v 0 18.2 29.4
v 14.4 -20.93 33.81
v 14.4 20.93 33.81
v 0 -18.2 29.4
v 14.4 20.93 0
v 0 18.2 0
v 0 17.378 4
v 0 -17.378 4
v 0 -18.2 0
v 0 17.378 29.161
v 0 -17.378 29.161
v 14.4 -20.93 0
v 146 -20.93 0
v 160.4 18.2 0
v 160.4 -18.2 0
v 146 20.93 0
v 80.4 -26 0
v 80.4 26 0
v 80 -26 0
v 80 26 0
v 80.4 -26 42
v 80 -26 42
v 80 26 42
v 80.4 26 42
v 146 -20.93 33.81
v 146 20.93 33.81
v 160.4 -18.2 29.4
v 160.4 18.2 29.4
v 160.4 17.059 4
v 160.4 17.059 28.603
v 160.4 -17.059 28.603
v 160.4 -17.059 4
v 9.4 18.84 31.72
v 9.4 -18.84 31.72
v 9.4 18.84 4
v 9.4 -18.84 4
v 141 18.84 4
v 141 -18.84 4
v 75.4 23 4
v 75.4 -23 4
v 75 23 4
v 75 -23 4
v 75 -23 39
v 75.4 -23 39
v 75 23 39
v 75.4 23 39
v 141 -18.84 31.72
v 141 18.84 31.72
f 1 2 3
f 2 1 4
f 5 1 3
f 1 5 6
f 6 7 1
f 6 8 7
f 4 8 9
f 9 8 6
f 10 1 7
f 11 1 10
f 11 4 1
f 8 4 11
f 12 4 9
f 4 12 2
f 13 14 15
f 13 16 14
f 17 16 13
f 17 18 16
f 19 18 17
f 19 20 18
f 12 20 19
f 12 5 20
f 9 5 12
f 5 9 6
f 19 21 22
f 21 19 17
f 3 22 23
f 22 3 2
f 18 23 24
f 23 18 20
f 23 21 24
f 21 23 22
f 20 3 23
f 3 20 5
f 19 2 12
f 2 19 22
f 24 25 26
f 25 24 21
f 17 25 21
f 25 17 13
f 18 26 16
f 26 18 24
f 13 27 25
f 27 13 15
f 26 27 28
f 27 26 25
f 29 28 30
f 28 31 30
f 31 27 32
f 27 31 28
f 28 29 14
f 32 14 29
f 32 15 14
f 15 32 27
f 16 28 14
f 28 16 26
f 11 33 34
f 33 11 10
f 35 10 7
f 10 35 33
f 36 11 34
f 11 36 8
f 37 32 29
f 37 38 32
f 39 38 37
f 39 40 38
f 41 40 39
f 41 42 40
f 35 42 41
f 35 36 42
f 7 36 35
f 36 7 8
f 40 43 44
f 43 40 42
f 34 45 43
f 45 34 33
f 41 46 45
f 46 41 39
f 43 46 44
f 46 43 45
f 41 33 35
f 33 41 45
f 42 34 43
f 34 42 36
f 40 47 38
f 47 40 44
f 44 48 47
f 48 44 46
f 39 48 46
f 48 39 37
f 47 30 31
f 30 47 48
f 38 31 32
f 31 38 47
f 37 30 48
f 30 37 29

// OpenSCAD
$fn = 32;

// ----------------------------------------------------------------------
// Faired channel: 160 x 52 x 42 mm, 3 mm walls, faired ends
// ----------------------------------------------------------------------

// --- parameters (mm) ---
length = 160;             // channel length
width = 52;               // channel width at mid length
height = 42;              // channel height at mid length
wall = 3;                 // side wall thickness
floor_t = 4;              // floor thickness
end_w = 36.4;             // faired end width
end_h = 29.4;             // faired end height

difference() {
  union() {
    hull() {
      translate([0, -18.2, 0]) cube([0.4, 36.4, 29.4]);
      translate([14.4, -20.93, 0]) cube([0.4, 41.86, 33.81]);
    }
    hull() {
      translate([14.4, -20.93, 0]) cube([0.4, 41.86, 33.81]);
      translate([80, -26, 0]) cube([0.4, 52, 42]);
    }
    hull() {
      translate([80, -26, 0]) cube([0.4, 52, 42]);
      translate([145.6, -20.93, 0]) cube([0.4, 41.86, 33.81]);
    }
    hull() {
      translate([145.6, -20.93, 0]) cube([0.4, 41.86, 33.81]);
      translate([160, -18.2, 0]) cube([0.4, 36.4, 29.4]);
    }
  }
  /* cavity, 5 mm proud of both ends so the ports are cut clean */
  hull() {
    translate([-5, -16.6, 4]) cube([0.4, 33.2, 23.8]);
    translate([9.4, -18.84, 4]) cube([0.4, 37.68, 27.72]);
  }
  hull() {
    translate([9.4, -18.84, 4]) cube([0.4, 37.68, 27.72]);
    translate([75, -23, 4]) cube([0.4, 46, 35]);
  }
  hull() {
    translate([75, -23, 4]) cube([0.4, 46, 35]);
    translate([140.6, -18.84, 4]) cube([0.4, 37.68, 27.72]);
  }
  hull() {
    translate([140.6, -18.84, 4]) cube([0.4, 37.68, 27.72]);
    translate([165, -16.6, 4]) cube([0.4, 33.2, 23.8]);
  }
}
